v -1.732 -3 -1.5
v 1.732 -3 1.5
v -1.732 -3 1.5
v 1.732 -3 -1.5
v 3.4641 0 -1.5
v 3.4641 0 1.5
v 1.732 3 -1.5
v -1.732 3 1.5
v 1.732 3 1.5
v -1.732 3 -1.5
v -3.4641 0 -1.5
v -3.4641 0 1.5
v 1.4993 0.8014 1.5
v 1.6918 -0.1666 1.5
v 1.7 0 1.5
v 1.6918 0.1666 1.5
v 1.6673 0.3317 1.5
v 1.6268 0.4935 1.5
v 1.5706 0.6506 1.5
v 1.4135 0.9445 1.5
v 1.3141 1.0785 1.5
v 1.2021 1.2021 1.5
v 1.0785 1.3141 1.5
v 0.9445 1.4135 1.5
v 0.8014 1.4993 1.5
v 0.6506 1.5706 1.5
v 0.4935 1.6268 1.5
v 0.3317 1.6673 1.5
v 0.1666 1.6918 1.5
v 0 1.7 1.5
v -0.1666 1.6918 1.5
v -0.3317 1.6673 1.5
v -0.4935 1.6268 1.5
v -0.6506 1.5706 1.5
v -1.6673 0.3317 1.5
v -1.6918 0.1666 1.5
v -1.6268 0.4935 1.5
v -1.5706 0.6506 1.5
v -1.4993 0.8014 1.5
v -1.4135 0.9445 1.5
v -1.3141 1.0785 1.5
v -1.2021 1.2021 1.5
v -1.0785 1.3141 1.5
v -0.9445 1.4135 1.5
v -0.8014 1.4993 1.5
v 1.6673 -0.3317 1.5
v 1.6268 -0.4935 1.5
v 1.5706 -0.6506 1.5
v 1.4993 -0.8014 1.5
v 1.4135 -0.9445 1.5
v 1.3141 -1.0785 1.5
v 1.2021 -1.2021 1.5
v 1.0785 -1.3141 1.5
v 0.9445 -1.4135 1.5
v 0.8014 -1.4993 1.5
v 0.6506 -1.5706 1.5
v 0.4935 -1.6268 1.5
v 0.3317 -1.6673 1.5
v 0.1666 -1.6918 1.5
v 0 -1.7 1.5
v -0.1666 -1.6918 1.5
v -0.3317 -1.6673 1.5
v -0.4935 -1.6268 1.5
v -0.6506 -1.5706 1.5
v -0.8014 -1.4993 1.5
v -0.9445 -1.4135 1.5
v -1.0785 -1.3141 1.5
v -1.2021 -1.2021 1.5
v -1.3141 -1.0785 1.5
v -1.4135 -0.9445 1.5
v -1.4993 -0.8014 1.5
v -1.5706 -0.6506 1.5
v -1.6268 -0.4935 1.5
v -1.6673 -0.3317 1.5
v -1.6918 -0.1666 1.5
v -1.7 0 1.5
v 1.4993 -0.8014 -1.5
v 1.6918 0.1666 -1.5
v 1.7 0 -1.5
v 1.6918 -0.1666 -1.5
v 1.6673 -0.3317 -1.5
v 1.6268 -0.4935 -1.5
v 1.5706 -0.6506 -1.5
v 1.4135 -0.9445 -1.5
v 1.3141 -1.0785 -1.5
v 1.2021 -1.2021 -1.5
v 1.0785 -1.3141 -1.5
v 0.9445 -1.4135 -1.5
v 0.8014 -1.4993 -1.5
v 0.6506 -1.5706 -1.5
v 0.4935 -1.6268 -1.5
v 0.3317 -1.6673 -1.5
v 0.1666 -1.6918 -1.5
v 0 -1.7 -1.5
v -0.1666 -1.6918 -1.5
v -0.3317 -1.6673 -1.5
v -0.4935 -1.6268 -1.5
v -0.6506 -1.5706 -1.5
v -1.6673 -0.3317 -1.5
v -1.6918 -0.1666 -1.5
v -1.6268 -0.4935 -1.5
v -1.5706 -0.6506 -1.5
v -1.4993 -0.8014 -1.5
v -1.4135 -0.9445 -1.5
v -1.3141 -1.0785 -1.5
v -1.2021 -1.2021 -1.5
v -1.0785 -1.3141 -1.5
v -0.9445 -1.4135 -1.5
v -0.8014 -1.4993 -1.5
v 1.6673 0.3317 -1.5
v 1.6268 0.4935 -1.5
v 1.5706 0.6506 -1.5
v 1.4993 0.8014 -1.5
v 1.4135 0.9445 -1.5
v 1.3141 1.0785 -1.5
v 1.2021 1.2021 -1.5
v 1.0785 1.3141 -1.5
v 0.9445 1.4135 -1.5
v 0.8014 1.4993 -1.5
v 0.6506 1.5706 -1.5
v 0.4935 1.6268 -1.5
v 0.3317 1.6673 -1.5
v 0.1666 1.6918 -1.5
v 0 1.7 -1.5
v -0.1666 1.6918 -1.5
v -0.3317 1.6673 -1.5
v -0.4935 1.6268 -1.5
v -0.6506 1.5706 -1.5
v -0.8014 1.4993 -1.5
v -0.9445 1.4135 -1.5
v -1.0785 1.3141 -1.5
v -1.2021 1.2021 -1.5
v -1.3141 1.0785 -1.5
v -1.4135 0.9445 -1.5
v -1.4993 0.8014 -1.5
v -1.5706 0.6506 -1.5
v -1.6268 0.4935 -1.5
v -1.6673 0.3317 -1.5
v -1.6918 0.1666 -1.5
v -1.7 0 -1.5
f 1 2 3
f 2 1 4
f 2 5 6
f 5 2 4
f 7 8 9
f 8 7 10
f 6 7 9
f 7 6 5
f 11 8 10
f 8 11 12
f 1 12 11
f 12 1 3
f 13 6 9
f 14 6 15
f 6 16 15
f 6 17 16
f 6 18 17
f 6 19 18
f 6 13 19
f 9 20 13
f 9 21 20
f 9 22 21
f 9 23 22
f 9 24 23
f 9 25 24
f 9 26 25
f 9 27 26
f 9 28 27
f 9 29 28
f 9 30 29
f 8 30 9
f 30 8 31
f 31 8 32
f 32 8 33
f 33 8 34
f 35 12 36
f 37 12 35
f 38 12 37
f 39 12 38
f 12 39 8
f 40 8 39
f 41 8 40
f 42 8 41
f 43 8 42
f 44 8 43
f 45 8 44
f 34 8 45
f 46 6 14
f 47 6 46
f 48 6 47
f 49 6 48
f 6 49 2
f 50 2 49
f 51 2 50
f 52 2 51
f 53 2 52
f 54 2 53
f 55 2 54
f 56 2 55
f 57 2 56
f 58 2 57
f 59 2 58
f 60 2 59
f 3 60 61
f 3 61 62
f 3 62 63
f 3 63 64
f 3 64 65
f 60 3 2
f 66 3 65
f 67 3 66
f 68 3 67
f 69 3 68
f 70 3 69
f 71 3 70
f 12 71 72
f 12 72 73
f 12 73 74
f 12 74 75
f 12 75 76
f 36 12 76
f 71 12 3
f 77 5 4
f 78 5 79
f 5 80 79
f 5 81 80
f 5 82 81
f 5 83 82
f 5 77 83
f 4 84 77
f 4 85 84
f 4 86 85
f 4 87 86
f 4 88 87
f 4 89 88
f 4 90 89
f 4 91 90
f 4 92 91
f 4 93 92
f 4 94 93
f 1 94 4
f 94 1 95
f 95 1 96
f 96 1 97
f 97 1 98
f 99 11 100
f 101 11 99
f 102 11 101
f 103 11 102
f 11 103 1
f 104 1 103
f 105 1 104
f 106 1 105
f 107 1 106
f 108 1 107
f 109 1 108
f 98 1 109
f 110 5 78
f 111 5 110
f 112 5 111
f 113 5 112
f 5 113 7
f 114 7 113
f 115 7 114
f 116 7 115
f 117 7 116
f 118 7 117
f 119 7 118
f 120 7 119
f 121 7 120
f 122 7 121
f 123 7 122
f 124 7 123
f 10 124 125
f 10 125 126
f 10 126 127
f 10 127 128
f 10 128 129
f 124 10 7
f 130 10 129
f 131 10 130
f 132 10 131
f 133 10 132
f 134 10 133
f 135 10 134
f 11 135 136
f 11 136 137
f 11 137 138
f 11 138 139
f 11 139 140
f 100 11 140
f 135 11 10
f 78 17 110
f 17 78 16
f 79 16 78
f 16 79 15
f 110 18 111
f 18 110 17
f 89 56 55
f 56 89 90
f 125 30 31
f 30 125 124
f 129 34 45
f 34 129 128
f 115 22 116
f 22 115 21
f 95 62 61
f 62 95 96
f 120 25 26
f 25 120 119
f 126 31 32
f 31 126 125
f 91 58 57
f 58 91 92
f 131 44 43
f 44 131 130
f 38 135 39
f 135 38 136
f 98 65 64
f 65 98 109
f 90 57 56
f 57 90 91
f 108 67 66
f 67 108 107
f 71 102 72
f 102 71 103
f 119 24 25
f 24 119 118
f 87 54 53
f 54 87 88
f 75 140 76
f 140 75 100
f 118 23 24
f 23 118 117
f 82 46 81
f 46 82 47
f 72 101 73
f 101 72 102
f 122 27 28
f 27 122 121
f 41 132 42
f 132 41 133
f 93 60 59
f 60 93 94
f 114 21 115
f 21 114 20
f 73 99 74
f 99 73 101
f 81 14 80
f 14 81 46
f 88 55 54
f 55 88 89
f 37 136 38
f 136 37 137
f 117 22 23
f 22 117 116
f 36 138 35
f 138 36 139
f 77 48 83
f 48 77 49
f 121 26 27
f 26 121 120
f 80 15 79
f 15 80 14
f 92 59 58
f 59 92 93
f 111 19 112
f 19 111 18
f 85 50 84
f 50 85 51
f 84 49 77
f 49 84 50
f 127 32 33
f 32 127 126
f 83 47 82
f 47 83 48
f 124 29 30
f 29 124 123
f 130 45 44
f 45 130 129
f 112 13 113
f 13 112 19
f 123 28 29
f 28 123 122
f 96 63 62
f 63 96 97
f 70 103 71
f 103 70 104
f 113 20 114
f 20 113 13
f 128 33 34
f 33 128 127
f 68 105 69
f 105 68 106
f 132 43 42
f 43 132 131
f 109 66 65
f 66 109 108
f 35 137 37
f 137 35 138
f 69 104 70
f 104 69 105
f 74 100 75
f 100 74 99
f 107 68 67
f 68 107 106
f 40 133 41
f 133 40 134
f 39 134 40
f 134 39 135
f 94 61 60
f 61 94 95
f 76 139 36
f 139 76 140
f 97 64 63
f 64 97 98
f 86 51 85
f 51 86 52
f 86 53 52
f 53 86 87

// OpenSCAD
$fn=64;

screw_d = 3.0;
across_flats = 6.0;
thickness = 3.0;

clearance = 0.4;
hole_d = screw_d + clearance;

module hex_prism(af, h){
    r = af / sqrt(3);
    cylinder(h=h, r=r, center=true, $fn=6);
}

module tslot_nut(af, h, hole_d){
    difference(){
        hex_prism(af, h);
        cylinder(h=h+0.6, d=hole_d, center=true, $fn=64);
    }
}

tslot_nut(across_flats, thickness, hole_d);
